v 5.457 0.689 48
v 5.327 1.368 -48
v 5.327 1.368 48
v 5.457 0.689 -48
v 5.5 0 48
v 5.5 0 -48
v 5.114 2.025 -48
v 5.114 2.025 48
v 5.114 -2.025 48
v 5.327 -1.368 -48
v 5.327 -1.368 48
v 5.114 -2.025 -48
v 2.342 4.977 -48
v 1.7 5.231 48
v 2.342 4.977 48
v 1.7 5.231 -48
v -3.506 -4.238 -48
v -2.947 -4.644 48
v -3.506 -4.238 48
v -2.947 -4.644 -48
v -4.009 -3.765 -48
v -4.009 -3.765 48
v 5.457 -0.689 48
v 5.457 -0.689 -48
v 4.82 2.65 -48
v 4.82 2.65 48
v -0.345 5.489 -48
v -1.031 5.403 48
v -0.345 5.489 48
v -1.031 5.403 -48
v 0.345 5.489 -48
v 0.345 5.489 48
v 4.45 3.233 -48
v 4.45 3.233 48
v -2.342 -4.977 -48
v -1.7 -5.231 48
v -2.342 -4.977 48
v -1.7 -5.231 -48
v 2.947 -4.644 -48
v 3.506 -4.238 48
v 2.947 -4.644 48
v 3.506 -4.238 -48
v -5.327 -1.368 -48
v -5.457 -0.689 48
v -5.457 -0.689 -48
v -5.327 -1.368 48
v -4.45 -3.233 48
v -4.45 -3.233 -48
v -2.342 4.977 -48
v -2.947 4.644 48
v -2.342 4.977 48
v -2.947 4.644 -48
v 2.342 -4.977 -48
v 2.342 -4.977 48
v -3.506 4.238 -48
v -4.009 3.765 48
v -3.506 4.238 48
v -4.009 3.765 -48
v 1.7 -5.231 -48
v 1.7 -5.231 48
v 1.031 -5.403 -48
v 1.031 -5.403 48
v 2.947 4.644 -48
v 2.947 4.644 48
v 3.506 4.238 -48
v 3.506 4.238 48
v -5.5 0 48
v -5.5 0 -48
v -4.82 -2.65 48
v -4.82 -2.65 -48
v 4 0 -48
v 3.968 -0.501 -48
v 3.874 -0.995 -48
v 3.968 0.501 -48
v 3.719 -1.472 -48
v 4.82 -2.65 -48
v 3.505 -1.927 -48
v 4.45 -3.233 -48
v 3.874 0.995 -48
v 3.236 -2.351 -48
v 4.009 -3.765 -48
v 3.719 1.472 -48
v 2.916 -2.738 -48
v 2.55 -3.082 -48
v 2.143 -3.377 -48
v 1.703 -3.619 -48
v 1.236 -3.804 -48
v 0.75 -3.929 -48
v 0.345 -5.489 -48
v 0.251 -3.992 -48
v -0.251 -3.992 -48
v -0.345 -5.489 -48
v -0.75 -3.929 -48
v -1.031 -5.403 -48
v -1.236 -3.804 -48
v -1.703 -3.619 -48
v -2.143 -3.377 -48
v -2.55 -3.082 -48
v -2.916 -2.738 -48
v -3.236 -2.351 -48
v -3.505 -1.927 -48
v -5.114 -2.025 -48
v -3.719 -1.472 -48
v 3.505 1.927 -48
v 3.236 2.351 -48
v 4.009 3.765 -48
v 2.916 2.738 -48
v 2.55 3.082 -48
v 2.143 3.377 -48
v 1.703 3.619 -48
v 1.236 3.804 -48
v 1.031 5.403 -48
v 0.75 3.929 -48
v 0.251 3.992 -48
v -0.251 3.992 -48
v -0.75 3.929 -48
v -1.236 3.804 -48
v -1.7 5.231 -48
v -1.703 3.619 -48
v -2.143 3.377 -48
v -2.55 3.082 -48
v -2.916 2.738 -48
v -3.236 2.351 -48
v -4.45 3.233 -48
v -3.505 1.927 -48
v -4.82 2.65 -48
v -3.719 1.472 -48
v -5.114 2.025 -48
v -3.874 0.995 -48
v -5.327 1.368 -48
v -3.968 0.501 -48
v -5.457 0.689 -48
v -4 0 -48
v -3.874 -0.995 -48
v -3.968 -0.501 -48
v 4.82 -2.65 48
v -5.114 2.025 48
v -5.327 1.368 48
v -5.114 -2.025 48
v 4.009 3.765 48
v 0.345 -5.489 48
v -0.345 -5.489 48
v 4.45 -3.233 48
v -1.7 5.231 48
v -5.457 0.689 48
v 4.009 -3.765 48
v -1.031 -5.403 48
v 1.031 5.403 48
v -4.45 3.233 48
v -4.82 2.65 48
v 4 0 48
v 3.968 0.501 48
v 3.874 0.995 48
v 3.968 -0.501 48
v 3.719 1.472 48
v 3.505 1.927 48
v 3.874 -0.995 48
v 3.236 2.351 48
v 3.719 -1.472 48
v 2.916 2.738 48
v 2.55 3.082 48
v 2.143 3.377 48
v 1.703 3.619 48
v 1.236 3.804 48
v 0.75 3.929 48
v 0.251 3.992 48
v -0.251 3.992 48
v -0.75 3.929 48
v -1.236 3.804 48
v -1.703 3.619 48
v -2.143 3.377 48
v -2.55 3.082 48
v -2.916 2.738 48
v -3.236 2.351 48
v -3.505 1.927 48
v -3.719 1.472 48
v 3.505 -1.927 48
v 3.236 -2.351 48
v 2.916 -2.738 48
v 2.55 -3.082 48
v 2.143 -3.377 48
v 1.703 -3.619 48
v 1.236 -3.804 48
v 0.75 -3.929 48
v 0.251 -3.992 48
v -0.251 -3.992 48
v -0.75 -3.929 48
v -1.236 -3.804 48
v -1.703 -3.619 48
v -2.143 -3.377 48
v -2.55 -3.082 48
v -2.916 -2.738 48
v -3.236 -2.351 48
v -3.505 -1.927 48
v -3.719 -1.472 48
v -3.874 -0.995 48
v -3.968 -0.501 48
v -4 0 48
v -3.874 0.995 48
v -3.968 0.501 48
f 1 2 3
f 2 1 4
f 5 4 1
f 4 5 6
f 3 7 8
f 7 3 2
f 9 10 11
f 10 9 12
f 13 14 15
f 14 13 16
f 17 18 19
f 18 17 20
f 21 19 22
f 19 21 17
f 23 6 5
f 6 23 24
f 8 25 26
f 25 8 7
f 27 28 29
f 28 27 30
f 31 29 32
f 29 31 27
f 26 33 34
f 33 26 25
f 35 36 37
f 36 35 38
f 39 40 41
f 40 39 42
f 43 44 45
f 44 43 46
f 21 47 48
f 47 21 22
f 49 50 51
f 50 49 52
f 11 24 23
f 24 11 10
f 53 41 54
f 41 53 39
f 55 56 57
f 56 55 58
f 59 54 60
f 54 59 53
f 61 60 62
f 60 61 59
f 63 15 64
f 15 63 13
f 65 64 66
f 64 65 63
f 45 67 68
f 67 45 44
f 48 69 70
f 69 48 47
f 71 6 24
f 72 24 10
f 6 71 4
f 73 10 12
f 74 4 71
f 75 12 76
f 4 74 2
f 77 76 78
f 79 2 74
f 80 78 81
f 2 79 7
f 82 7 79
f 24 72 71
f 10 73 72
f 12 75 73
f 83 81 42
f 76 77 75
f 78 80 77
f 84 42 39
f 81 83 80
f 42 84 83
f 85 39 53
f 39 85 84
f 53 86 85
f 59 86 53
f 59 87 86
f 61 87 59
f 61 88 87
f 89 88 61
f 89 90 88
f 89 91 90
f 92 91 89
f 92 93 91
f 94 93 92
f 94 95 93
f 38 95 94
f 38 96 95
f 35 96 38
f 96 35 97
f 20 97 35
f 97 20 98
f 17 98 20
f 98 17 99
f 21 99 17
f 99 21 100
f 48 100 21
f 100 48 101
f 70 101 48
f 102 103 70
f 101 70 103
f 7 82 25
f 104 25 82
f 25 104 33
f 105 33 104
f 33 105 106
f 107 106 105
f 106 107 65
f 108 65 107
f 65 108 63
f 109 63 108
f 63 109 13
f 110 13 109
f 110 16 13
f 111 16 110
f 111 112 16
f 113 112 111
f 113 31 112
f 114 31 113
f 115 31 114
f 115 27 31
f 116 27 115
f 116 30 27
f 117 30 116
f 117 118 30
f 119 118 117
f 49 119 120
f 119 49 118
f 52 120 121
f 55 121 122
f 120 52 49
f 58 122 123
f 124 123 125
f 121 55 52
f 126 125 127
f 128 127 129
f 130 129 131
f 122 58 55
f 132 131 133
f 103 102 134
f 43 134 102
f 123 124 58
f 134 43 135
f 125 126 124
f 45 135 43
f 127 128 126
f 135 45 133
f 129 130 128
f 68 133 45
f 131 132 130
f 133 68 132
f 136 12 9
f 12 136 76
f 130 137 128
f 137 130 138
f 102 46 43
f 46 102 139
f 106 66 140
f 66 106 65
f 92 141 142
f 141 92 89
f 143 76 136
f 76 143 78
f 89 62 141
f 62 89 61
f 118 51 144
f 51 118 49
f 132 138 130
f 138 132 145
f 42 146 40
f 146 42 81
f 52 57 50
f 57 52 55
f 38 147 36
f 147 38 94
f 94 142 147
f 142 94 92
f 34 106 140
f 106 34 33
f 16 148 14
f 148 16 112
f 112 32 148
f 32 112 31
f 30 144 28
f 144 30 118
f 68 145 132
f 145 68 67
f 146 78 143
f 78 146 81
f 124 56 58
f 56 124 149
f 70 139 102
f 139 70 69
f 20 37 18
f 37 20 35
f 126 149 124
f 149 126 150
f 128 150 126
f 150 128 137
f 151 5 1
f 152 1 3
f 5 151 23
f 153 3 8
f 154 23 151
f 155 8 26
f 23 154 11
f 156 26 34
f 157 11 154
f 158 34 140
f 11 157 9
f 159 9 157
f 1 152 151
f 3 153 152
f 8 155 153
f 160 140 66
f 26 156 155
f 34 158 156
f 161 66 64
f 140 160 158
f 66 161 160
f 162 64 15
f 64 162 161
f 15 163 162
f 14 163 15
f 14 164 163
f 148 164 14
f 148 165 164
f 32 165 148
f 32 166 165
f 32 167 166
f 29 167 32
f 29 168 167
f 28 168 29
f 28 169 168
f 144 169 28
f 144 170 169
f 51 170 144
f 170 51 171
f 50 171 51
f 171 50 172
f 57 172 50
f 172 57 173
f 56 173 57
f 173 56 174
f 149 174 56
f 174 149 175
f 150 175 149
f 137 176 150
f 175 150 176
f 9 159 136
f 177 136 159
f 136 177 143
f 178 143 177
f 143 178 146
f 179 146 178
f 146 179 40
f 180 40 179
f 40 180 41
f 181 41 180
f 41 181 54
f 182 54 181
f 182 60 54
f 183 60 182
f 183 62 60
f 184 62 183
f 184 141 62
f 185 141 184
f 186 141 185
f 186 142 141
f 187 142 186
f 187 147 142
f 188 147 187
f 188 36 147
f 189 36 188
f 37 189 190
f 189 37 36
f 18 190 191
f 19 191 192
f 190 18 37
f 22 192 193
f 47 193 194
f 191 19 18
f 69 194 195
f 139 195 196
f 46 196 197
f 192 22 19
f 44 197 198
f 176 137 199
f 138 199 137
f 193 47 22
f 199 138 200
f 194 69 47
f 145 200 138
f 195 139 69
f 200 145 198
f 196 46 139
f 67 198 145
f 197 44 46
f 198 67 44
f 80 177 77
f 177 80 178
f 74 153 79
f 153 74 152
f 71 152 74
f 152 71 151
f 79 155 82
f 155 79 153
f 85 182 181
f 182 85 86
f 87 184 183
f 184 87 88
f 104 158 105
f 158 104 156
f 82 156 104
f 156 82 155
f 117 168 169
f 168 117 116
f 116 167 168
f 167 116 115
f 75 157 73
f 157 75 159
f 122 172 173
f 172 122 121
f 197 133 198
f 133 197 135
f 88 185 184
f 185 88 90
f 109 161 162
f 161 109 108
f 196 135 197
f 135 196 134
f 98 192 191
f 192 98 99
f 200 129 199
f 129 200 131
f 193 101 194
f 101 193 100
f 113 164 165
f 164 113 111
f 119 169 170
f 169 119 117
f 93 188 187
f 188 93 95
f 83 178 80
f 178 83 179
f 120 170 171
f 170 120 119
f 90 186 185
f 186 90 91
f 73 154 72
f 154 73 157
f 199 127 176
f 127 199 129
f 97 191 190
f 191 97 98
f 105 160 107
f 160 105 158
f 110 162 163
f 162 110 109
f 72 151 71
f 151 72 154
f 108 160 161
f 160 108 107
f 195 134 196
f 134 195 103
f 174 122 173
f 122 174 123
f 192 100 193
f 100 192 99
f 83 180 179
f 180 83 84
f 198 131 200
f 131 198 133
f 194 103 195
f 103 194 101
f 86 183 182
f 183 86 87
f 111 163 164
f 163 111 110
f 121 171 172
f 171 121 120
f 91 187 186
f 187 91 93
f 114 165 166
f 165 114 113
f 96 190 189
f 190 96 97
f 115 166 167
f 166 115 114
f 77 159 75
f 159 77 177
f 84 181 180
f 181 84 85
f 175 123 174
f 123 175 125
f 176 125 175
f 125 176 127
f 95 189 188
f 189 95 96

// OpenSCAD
$fn = 50;


difference() {
	union() {
		translate(v = [0, 0, -48.0000000000]) {
			cylinder(h = 96, r = 5.5000000000);
		}
	}
	union() {
		translate(v = [0, 0, -100.0000000000]) {
			cylinder(h = 200, r = 4.0000000000);
		}
	}
}
